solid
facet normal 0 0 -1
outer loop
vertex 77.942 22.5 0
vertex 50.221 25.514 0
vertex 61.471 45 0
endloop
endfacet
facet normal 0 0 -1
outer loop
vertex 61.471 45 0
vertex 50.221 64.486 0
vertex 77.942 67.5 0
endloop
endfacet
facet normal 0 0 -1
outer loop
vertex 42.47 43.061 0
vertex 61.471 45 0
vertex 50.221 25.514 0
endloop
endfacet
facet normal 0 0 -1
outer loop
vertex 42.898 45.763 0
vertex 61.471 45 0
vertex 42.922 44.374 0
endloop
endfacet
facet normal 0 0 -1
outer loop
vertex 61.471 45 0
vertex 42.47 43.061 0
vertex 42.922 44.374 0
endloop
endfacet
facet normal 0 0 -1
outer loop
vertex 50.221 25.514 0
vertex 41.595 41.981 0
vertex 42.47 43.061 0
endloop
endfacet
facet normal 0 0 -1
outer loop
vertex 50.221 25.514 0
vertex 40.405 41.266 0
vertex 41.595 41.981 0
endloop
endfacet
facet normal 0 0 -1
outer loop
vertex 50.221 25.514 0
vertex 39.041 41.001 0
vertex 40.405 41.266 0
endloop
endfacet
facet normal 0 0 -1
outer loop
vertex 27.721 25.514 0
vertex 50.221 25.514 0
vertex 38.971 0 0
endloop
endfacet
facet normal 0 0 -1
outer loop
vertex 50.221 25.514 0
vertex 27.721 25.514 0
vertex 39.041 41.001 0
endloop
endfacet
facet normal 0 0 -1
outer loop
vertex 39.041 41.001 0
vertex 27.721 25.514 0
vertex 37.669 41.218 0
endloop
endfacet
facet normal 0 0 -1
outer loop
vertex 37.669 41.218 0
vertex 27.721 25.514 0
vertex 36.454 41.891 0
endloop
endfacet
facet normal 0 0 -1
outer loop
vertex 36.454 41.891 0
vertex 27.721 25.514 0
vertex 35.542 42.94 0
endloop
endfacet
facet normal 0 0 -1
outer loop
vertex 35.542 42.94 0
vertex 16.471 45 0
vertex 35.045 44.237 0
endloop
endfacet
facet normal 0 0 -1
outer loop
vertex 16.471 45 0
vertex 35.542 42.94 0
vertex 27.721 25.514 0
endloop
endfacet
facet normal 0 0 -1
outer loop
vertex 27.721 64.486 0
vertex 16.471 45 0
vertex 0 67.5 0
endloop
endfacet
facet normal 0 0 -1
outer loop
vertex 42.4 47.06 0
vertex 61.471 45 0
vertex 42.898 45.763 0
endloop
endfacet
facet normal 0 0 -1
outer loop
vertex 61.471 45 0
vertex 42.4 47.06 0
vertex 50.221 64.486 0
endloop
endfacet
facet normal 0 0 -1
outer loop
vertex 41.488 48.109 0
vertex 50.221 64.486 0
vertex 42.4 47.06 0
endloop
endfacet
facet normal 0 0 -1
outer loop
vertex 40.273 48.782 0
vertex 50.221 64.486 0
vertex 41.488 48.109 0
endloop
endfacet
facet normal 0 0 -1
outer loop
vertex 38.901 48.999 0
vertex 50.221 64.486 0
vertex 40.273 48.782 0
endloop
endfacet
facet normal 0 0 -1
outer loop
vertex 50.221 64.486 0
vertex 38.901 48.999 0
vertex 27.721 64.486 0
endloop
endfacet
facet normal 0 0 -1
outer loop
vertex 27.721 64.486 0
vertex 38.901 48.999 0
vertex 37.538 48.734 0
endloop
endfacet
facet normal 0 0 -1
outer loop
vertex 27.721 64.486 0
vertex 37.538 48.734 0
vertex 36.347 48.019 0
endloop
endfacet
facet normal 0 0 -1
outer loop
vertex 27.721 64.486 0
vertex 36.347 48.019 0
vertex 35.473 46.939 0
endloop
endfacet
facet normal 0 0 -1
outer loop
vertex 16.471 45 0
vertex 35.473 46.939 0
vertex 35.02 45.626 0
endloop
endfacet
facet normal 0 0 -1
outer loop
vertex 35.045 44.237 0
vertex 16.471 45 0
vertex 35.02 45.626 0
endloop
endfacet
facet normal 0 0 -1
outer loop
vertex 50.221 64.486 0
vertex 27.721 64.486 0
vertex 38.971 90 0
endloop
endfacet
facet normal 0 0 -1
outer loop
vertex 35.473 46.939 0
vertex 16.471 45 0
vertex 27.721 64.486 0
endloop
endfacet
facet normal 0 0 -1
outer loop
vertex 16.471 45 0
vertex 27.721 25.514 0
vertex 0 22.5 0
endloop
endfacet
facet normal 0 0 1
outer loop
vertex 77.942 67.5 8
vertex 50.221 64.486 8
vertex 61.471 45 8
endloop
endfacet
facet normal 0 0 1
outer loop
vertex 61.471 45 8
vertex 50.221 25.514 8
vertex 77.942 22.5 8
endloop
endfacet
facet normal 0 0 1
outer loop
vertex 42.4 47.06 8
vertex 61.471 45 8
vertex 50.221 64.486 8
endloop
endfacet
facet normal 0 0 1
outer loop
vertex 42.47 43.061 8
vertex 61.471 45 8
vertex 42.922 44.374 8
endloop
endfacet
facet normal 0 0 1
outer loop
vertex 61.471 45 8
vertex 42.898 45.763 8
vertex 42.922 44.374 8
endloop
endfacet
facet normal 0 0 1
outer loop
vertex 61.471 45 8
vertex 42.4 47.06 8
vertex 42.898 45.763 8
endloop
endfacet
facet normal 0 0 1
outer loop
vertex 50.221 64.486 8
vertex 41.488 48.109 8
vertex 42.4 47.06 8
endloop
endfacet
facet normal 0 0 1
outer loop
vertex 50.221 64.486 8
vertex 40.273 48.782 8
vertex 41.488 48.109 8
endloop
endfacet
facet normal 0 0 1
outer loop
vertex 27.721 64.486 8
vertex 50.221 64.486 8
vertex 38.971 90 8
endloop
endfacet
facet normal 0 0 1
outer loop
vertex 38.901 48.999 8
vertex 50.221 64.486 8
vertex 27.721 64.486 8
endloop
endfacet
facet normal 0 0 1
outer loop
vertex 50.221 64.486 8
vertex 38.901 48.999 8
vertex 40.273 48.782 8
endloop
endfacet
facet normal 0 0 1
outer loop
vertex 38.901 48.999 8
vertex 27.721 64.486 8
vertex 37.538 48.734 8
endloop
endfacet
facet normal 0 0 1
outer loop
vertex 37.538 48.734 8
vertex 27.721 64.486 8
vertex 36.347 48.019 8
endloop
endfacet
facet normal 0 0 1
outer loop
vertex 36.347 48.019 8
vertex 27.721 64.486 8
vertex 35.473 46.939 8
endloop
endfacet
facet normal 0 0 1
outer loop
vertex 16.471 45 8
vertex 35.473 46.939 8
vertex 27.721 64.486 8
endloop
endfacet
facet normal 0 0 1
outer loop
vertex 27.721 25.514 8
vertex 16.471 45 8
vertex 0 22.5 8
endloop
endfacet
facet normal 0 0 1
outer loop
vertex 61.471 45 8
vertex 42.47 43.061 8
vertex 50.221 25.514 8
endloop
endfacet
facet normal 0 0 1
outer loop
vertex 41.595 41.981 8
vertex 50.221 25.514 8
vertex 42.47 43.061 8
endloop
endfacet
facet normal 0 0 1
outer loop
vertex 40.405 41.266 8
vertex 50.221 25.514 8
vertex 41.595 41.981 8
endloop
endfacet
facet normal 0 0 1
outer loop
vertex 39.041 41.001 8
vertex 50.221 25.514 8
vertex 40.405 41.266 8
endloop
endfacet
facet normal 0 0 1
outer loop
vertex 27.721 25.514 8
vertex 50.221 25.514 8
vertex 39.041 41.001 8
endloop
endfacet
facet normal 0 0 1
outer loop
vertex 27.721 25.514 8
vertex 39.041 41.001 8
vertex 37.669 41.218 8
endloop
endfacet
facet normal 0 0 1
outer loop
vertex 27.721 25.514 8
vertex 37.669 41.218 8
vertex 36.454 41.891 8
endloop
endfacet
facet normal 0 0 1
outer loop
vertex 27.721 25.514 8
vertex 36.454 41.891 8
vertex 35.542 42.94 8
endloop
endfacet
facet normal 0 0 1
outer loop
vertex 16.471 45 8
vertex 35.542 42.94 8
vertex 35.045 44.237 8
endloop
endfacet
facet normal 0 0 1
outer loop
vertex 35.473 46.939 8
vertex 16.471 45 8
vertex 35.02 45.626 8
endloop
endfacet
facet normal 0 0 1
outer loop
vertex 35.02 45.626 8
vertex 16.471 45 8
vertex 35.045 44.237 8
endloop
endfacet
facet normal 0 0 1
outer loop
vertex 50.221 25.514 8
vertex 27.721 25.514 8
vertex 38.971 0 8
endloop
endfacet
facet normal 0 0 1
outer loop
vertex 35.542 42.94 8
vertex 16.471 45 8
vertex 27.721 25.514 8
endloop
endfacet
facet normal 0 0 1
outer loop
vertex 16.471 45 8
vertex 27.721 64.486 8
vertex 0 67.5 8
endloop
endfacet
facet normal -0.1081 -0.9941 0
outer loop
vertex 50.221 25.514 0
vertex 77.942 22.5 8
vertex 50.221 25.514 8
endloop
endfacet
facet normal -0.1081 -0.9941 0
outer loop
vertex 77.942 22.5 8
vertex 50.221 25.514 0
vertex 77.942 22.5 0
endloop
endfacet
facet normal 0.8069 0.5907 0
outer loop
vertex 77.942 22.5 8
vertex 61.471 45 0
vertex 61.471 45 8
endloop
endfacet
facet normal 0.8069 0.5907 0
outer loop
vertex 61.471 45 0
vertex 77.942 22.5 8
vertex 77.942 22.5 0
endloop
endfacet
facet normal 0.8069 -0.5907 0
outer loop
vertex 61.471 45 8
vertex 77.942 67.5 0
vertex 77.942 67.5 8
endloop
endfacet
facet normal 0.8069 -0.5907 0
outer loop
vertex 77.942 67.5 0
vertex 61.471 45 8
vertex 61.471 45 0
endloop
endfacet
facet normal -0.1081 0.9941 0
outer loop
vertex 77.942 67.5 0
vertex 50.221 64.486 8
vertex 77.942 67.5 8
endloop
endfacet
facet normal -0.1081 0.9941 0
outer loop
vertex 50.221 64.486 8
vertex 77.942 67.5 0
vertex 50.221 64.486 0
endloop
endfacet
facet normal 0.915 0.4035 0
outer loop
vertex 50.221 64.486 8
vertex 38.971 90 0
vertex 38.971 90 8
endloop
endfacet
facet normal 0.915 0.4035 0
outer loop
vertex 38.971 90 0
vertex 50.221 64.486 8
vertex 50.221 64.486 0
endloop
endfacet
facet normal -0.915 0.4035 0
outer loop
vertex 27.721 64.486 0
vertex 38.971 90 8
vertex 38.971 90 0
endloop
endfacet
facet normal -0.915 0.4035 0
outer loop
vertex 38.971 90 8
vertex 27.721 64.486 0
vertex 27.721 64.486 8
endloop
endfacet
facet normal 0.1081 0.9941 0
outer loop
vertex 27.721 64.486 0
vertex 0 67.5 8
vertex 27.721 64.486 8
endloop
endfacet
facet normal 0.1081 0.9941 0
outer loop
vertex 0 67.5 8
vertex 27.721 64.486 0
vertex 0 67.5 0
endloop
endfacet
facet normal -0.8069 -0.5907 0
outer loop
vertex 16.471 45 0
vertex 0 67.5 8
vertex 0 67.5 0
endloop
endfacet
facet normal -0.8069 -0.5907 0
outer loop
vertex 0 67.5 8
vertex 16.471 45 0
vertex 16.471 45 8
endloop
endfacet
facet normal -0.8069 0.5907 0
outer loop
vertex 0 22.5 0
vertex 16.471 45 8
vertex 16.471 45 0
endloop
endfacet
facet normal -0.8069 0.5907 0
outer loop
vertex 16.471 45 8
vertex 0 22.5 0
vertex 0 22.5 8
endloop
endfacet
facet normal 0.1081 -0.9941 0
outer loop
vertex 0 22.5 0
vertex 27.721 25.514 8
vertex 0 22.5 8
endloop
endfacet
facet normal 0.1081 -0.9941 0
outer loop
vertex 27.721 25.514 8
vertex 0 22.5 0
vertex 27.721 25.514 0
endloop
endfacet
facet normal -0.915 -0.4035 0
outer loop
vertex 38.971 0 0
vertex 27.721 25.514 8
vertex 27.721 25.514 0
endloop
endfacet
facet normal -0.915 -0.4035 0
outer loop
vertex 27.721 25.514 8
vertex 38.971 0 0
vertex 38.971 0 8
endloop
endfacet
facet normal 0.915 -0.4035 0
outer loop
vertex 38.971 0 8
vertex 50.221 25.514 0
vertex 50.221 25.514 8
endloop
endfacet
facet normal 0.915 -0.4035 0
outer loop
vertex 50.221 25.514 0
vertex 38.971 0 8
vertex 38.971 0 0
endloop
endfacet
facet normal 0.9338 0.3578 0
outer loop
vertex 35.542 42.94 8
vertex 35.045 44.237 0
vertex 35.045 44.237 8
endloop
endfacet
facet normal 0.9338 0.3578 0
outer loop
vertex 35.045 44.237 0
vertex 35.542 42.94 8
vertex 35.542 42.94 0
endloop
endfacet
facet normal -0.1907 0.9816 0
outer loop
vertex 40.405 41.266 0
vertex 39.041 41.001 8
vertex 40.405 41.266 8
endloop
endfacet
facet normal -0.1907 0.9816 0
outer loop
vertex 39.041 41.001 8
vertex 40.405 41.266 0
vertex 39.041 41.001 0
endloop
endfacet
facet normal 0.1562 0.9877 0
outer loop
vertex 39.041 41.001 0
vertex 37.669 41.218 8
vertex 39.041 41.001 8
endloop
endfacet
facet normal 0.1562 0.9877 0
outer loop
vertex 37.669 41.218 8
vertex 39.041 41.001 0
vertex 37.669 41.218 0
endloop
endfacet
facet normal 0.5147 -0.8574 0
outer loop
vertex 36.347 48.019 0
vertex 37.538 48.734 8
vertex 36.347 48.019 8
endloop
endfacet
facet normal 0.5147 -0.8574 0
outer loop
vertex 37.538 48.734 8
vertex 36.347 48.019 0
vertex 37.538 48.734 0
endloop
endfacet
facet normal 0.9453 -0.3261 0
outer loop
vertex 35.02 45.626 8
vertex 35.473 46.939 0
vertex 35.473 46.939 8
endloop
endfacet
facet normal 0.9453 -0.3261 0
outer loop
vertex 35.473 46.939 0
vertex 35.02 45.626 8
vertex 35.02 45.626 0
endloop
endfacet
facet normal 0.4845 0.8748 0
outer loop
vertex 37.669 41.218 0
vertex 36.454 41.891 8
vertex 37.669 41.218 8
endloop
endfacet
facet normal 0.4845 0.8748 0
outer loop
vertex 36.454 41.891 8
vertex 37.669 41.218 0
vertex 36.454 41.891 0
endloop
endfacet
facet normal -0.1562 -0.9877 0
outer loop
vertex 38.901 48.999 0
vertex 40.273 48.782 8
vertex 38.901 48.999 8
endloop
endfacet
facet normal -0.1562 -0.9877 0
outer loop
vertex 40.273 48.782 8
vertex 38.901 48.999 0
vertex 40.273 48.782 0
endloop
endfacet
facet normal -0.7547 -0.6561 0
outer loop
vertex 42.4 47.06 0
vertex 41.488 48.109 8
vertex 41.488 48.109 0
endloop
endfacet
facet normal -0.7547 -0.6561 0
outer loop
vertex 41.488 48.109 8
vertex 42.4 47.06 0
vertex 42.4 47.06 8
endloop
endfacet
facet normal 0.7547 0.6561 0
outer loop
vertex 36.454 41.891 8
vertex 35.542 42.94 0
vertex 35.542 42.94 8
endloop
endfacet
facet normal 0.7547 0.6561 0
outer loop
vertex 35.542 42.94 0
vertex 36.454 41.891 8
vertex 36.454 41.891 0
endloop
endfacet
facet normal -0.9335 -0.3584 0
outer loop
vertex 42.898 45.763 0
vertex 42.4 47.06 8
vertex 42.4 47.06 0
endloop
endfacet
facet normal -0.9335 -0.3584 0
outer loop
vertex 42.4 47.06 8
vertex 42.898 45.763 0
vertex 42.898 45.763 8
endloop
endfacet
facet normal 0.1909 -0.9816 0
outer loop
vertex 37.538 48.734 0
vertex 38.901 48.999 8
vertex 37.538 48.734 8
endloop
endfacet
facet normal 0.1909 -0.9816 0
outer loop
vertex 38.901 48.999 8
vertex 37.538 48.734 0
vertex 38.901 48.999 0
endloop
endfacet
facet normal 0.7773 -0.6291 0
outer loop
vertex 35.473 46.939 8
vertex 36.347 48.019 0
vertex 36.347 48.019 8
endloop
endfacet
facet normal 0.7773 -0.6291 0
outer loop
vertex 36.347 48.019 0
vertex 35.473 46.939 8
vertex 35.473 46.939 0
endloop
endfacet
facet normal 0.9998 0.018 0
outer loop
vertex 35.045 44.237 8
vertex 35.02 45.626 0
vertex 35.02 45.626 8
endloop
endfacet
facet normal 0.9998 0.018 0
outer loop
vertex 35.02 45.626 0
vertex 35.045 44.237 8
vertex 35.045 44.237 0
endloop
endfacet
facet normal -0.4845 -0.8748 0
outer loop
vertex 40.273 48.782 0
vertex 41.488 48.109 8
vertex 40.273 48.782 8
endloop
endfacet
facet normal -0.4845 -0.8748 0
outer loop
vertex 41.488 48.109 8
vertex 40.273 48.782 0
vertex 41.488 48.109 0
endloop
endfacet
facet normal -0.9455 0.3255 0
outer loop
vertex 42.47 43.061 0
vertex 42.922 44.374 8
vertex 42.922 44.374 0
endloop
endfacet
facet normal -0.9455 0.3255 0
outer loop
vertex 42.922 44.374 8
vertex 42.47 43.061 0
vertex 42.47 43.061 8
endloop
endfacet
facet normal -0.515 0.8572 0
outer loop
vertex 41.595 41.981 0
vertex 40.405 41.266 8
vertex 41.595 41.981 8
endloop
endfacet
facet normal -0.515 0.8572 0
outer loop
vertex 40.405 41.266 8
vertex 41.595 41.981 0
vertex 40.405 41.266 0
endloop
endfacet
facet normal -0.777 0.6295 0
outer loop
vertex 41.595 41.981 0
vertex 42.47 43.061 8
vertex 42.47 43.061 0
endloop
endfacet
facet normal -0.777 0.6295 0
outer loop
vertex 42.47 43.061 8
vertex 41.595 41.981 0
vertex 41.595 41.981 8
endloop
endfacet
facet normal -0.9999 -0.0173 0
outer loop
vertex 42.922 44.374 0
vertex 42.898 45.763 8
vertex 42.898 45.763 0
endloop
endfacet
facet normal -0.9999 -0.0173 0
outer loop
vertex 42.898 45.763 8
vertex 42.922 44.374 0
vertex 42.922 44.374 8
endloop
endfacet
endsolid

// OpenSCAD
$fn = 32;

// ----------------------------------------------------------------------
// Star wheel: 6-point star, R45
// ----------------------------------------------------------------------

// --- parameters (mm) ---
n_points = 6;             // number of points / teeth
r_out = 45;               // tip radius
r_in = 22.5;              // root radius
bore_r = 4;               // centre bore radius
plate_t = 8;              // plate thickness, Z (extrusion height)
bore_d = 8;               // centre bore diameter

profile = [[38.971, 90], [27.721, 64.486], [0, 67.5], [16.471, 45], [0, 22.5], [27.721, 25.514], [38.971, 0], [50.221, 25.514], [77.942, 22.5], [61.471, 45], [77.942, 67.5], [50.221, 64.486]];  // primary outline, 12 points, counter clockwise
void_1 = [[42.898, 45.763], [42.4, 47.06], [41.488, 48.109], [40.273, 48.782], [38.901, 48.999], [37.538, 48.734], [36.347, 48.019], [35.473, 46.939], [35.02, 45.626], [35.045, 44.237], [35.542, 42.94], [36.454, 41.891], [37.669, 41.218], [39.041, 41.001], [40.405, 41.266], [41.595, 41.981], [42.47, 43.061], [42.922, 44.374]];  // centre bore, 18 points

// --- the one profile operation ---
difference() {
  linear_extrude(height = plate_t) polygon(points = profile);
  translate([0, 0, -1])
    linear_extrude(height = plate_t + 2) polygon(points = void_1);
}
